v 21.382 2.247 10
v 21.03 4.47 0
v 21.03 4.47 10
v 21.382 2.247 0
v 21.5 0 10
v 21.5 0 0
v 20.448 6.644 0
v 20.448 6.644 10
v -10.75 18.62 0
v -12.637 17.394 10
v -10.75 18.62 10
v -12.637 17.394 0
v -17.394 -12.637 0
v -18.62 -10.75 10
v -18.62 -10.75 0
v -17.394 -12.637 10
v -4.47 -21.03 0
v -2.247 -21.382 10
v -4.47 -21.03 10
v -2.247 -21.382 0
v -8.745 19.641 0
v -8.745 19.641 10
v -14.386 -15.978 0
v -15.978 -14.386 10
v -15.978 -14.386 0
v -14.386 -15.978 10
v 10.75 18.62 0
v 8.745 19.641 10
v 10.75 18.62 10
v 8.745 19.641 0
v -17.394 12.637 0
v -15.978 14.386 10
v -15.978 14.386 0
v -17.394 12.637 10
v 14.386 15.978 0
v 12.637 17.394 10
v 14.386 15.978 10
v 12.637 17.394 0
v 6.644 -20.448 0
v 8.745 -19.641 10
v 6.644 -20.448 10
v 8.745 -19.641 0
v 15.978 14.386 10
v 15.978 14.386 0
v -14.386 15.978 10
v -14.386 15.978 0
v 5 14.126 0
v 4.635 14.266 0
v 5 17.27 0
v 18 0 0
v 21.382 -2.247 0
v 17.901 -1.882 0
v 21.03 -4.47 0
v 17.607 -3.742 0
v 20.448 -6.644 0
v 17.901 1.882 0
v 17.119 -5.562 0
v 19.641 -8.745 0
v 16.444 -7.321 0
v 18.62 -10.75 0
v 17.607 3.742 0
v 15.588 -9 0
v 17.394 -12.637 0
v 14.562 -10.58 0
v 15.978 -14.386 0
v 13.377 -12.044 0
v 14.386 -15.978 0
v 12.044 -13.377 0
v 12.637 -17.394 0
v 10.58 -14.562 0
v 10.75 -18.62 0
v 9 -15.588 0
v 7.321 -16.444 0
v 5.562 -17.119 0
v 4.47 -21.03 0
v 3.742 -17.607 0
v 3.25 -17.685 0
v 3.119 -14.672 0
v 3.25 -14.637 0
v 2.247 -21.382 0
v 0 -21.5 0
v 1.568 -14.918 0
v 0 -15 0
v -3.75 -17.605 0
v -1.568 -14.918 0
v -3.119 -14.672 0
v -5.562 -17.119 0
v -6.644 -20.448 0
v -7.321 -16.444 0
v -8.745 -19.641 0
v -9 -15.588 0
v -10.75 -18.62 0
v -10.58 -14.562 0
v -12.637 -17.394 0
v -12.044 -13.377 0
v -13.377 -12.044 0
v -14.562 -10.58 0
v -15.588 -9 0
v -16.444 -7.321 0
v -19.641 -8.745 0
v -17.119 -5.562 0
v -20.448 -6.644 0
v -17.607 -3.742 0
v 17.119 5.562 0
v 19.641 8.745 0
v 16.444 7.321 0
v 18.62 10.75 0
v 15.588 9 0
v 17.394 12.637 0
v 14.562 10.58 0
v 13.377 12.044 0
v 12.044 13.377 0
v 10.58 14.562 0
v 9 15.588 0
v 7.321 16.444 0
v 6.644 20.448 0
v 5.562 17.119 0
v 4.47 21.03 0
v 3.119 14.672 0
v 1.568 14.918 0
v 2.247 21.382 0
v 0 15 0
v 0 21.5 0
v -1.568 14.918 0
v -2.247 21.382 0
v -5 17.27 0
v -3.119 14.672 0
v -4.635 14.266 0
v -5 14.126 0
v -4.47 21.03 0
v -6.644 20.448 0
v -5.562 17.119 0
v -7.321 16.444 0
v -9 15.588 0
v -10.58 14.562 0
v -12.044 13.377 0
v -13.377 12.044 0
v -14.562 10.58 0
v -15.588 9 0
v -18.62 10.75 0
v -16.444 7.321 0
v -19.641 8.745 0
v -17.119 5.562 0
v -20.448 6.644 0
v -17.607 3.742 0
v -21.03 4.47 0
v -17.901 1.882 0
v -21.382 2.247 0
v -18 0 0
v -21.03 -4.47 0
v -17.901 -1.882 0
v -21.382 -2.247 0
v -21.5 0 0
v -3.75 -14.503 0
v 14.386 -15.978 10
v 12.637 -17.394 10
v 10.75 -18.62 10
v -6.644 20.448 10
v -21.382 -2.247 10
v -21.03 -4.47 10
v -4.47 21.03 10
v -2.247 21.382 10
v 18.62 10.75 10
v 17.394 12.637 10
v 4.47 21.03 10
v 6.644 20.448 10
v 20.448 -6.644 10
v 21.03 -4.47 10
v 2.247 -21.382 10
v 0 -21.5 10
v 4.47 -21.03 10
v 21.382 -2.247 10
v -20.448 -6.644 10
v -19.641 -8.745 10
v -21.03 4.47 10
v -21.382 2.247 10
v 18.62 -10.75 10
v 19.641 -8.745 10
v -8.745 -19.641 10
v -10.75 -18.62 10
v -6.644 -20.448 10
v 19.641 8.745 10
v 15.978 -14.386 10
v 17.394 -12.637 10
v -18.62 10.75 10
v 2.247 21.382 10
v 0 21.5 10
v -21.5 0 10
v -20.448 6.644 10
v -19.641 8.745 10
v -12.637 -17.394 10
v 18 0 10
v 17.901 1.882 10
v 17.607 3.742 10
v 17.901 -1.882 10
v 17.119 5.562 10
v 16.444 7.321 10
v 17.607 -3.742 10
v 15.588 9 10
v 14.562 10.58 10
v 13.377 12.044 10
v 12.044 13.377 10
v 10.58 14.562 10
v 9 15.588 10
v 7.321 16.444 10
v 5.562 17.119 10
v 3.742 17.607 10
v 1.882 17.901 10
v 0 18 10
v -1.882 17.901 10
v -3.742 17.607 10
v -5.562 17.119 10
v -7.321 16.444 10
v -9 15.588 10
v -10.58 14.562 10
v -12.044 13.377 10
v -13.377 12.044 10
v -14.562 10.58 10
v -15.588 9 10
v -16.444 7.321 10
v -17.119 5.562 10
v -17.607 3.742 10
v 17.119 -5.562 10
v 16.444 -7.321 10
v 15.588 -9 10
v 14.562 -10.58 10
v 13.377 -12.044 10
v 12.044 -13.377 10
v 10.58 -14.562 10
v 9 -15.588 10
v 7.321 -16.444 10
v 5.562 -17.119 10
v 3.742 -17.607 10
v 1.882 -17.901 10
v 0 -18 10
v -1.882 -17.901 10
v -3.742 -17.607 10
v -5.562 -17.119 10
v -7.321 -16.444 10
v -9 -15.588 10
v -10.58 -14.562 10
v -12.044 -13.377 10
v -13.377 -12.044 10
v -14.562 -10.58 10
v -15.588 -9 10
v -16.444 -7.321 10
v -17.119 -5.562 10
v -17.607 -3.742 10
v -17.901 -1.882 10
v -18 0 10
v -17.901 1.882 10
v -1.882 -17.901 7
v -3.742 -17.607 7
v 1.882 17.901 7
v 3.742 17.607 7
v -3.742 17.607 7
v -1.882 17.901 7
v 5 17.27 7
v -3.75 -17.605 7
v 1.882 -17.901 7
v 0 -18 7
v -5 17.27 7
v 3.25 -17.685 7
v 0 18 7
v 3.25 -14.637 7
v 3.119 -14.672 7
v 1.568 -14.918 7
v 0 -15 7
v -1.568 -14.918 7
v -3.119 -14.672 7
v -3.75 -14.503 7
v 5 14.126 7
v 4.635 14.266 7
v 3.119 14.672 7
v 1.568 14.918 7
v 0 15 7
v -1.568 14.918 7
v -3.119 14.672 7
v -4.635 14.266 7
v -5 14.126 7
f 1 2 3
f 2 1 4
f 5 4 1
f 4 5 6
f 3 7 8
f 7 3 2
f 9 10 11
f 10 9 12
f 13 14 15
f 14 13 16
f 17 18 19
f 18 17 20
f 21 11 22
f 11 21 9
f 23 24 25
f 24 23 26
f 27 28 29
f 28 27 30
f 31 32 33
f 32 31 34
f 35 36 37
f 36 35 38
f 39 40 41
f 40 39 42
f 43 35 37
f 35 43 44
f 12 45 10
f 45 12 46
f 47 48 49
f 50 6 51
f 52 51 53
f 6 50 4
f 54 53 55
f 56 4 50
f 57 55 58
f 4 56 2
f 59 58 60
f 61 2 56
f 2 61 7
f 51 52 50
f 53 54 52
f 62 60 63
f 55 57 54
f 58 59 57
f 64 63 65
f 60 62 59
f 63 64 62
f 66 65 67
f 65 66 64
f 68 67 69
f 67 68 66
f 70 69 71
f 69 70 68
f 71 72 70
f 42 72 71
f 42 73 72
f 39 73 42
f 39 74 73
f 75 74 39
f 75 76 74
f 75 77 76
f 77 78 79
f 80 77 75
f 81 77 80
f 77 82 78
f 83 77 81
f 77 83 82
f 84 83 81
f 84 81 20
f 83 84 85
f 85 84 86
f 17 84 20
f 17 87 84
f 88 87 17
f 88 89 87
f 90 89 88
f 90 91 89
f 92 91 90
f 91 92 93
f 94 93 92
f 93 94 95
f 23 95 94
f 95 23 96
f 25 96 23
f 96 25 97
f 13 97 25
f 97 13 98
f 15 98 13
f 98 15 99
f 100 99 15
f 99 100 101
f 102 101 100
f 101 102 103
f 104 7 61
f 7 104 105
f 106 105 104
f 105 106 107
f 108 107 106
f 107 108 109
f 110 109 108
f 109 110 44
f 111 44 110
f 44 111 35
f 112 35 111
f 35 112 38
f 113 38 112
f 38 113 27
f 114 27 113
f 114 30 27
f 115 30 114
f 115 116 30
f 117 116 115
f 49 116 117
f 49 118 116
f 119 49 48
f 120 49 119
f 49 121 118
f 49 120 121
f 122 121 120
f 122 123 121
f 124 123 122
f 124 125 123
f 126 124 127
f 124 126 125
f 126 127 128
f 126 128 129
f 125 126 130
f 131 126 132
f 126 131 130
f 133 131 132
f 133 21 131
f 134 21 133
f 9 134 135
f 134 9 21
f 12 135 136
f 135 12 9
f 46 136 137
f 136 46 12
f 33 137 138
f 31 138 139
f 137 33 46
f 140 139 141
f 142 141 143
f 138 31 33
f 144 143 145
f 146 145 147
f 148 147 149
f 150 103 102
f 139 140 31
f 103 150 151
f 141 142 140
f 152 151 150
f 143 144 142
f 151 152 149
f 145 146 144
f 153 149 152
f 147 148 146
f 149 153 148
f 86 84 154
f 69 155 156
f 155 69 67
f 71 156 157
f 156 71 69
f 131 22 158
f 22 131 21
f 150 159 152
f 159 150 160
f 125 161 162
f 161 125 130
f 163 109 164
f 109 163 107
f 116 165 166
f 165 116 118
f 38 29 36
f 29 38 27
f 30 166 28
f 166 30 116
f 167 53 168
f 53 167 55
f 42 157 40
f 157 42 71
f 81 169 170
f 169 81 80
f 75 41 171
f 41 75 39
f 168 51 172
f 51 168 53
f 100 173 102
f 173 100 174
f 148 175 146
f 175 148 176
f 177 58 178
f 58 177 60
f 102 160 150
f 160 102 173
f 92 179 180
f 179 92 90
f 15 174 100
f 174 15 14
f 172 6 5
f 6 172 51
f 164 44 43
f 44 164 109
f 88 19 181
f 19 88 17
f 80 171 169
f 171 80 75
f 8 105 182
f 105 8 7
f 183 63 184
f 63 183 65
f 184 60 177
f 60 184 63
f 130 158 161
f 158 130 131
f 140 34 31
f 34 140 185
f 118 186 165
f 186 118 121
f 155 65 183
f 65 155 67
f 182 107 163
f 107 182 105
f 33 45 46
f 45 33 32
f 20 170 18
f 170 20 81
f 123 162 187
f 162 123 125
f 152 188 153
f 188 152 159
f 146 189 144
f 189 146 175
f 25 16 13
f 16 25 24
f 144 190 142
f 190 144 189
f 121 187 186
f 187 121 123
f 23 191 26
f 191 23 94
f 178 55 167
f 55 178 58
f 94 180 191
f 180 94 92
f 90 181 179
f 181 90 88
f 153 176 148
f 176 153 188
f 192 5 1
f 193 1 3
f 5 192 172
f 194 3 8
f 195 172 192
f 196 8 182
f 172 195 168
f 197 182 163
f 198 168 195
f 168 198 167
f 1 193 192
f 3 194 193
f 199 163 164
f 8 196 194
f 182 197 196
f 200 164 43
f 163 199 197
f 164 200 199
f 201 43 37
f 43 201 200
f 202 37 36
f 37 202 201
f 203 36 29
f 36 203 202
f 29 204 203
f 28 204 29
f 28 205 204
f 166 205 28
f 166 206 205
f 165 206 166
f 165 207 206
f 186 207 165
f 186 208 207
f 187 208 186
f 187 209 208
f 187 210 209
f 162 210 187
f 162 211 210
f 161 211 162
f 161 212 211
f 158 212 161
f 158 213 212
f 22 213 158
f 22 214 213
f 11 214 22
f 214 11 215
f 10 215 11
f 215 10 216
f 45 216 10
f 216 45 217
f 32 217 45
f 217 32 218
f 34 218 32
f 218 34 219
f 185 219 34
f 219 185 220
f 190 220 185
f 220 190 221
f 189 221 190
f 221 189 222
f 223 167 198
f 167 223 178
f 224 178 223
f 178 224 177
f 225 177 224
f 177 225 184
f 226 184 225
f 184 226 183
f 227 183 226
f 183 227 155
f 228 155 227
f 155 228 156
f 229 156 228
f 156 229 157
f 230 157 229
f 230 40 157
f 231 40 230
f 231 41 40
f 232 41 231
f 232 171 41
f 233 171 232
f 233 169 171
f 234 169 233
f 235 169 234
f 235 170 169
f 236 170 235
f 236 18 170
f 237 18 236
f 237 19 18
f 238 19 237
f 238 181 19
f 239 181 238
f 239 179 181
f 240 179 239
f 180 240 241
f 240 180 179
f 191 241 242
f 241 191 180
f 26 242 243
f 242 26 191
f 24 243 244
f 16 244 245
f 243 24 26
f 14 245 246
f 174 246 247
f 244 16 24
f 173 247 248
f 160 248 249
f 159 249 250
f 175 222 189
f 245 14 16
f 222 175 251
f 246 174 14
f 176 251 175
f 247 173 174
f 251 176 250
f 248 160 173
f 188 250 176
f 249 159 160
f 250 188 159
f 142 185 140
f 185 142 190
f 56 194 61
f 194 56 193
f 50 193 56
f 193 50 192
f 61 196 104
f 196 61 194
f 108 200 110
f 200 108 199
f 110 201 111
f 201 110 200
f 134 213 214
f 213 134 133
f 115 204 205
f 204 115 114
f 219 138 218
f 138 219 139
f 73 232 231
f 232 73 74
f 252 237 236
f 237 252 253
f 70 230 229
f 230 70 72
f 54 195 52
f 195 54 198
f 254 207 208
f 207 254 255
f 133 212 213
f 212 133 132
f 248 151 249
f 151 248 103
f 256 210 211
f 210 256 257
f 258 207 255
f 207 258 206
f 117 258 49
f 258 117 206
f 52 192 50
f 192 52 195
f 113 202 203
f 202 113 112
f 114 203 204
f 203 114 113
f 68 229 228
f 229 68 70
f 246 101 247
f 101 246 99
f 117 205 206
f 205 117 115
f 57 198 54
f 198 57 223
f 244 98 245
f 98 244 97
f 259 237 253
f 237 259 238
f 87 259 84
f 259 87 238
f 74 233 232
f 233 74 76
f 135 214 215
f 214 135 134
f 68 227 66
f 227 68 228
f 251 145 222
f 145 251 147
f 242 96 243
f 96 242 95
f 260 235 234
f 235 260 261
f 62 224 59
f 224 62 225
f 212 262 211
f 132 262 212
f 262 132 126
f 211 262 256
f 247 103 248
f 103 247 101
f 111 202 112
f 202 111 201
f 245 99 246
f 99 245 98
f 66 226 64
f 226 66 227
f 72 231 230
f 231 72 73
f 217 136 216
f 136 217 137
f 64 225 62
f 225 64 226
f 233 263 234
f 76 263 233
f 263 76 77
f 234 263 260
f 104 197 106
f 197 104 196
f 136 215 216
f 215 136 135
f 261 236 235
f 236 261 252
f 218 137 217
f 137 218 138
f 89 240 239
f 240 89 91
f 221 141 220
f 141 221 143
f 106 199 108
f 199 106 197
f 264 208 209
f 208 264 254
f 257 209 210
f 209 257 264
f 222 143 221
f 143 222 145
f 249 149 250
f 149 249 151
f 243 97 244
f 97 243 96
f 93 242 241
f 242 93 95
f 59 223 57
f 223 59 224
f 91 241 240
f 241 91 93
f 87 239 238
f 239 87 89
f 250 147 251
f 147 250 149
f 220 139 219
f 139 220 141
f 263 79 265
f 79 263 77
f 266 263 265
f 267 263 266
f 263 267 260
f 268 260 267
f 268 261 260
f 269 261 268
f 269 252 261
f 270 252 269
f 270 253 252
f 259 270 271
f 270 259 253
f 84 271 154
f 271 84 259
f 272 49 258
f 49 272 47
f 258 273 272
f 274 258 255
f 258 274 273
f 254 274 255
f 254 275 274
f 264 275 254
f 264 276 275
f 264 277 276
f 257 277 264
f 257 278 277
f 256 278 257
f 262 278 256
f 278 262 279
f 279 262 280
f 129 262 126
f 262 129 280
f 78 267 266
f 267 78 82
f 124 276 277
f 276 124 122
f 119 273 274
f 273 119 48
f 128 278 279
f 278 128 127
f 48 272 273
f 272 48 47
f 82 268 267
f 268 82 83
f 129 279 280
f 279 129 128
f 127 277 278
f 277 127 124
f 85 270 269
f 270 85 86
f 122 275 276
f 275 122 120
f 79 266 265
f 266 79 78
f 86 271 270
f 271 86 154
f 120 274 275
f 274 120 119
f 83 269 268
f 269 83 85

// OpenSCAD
resolution=60;

color("blue")
//		translate([x_offset, y_offset, z_offset])
	difference(){
		cylinder(h = 10, r=43/2, $fn=resolution);		//outer
		translate([0,0,-1])
			cylinder(h = 55, r=36/2, $fn=resolution);	//inner
	}


color ("orange")
difference(){
	union(){
		translate ([-7.5/2,-19,0])
			cube ( [7,11,7	]);						// small wedge, lower
		translate ([-5,8,0])
			cube ( [10,11,7	]);						// large wedge, upper
	}
	translate([0,0,-1])		
		cylinder(h=25,r=30/2,$fn=resolution);	// barrel curve
}


//	translate([x_offset , y_offset -4, z_offset + 1.5 ])
	//		rotate([90,0,0]) 
